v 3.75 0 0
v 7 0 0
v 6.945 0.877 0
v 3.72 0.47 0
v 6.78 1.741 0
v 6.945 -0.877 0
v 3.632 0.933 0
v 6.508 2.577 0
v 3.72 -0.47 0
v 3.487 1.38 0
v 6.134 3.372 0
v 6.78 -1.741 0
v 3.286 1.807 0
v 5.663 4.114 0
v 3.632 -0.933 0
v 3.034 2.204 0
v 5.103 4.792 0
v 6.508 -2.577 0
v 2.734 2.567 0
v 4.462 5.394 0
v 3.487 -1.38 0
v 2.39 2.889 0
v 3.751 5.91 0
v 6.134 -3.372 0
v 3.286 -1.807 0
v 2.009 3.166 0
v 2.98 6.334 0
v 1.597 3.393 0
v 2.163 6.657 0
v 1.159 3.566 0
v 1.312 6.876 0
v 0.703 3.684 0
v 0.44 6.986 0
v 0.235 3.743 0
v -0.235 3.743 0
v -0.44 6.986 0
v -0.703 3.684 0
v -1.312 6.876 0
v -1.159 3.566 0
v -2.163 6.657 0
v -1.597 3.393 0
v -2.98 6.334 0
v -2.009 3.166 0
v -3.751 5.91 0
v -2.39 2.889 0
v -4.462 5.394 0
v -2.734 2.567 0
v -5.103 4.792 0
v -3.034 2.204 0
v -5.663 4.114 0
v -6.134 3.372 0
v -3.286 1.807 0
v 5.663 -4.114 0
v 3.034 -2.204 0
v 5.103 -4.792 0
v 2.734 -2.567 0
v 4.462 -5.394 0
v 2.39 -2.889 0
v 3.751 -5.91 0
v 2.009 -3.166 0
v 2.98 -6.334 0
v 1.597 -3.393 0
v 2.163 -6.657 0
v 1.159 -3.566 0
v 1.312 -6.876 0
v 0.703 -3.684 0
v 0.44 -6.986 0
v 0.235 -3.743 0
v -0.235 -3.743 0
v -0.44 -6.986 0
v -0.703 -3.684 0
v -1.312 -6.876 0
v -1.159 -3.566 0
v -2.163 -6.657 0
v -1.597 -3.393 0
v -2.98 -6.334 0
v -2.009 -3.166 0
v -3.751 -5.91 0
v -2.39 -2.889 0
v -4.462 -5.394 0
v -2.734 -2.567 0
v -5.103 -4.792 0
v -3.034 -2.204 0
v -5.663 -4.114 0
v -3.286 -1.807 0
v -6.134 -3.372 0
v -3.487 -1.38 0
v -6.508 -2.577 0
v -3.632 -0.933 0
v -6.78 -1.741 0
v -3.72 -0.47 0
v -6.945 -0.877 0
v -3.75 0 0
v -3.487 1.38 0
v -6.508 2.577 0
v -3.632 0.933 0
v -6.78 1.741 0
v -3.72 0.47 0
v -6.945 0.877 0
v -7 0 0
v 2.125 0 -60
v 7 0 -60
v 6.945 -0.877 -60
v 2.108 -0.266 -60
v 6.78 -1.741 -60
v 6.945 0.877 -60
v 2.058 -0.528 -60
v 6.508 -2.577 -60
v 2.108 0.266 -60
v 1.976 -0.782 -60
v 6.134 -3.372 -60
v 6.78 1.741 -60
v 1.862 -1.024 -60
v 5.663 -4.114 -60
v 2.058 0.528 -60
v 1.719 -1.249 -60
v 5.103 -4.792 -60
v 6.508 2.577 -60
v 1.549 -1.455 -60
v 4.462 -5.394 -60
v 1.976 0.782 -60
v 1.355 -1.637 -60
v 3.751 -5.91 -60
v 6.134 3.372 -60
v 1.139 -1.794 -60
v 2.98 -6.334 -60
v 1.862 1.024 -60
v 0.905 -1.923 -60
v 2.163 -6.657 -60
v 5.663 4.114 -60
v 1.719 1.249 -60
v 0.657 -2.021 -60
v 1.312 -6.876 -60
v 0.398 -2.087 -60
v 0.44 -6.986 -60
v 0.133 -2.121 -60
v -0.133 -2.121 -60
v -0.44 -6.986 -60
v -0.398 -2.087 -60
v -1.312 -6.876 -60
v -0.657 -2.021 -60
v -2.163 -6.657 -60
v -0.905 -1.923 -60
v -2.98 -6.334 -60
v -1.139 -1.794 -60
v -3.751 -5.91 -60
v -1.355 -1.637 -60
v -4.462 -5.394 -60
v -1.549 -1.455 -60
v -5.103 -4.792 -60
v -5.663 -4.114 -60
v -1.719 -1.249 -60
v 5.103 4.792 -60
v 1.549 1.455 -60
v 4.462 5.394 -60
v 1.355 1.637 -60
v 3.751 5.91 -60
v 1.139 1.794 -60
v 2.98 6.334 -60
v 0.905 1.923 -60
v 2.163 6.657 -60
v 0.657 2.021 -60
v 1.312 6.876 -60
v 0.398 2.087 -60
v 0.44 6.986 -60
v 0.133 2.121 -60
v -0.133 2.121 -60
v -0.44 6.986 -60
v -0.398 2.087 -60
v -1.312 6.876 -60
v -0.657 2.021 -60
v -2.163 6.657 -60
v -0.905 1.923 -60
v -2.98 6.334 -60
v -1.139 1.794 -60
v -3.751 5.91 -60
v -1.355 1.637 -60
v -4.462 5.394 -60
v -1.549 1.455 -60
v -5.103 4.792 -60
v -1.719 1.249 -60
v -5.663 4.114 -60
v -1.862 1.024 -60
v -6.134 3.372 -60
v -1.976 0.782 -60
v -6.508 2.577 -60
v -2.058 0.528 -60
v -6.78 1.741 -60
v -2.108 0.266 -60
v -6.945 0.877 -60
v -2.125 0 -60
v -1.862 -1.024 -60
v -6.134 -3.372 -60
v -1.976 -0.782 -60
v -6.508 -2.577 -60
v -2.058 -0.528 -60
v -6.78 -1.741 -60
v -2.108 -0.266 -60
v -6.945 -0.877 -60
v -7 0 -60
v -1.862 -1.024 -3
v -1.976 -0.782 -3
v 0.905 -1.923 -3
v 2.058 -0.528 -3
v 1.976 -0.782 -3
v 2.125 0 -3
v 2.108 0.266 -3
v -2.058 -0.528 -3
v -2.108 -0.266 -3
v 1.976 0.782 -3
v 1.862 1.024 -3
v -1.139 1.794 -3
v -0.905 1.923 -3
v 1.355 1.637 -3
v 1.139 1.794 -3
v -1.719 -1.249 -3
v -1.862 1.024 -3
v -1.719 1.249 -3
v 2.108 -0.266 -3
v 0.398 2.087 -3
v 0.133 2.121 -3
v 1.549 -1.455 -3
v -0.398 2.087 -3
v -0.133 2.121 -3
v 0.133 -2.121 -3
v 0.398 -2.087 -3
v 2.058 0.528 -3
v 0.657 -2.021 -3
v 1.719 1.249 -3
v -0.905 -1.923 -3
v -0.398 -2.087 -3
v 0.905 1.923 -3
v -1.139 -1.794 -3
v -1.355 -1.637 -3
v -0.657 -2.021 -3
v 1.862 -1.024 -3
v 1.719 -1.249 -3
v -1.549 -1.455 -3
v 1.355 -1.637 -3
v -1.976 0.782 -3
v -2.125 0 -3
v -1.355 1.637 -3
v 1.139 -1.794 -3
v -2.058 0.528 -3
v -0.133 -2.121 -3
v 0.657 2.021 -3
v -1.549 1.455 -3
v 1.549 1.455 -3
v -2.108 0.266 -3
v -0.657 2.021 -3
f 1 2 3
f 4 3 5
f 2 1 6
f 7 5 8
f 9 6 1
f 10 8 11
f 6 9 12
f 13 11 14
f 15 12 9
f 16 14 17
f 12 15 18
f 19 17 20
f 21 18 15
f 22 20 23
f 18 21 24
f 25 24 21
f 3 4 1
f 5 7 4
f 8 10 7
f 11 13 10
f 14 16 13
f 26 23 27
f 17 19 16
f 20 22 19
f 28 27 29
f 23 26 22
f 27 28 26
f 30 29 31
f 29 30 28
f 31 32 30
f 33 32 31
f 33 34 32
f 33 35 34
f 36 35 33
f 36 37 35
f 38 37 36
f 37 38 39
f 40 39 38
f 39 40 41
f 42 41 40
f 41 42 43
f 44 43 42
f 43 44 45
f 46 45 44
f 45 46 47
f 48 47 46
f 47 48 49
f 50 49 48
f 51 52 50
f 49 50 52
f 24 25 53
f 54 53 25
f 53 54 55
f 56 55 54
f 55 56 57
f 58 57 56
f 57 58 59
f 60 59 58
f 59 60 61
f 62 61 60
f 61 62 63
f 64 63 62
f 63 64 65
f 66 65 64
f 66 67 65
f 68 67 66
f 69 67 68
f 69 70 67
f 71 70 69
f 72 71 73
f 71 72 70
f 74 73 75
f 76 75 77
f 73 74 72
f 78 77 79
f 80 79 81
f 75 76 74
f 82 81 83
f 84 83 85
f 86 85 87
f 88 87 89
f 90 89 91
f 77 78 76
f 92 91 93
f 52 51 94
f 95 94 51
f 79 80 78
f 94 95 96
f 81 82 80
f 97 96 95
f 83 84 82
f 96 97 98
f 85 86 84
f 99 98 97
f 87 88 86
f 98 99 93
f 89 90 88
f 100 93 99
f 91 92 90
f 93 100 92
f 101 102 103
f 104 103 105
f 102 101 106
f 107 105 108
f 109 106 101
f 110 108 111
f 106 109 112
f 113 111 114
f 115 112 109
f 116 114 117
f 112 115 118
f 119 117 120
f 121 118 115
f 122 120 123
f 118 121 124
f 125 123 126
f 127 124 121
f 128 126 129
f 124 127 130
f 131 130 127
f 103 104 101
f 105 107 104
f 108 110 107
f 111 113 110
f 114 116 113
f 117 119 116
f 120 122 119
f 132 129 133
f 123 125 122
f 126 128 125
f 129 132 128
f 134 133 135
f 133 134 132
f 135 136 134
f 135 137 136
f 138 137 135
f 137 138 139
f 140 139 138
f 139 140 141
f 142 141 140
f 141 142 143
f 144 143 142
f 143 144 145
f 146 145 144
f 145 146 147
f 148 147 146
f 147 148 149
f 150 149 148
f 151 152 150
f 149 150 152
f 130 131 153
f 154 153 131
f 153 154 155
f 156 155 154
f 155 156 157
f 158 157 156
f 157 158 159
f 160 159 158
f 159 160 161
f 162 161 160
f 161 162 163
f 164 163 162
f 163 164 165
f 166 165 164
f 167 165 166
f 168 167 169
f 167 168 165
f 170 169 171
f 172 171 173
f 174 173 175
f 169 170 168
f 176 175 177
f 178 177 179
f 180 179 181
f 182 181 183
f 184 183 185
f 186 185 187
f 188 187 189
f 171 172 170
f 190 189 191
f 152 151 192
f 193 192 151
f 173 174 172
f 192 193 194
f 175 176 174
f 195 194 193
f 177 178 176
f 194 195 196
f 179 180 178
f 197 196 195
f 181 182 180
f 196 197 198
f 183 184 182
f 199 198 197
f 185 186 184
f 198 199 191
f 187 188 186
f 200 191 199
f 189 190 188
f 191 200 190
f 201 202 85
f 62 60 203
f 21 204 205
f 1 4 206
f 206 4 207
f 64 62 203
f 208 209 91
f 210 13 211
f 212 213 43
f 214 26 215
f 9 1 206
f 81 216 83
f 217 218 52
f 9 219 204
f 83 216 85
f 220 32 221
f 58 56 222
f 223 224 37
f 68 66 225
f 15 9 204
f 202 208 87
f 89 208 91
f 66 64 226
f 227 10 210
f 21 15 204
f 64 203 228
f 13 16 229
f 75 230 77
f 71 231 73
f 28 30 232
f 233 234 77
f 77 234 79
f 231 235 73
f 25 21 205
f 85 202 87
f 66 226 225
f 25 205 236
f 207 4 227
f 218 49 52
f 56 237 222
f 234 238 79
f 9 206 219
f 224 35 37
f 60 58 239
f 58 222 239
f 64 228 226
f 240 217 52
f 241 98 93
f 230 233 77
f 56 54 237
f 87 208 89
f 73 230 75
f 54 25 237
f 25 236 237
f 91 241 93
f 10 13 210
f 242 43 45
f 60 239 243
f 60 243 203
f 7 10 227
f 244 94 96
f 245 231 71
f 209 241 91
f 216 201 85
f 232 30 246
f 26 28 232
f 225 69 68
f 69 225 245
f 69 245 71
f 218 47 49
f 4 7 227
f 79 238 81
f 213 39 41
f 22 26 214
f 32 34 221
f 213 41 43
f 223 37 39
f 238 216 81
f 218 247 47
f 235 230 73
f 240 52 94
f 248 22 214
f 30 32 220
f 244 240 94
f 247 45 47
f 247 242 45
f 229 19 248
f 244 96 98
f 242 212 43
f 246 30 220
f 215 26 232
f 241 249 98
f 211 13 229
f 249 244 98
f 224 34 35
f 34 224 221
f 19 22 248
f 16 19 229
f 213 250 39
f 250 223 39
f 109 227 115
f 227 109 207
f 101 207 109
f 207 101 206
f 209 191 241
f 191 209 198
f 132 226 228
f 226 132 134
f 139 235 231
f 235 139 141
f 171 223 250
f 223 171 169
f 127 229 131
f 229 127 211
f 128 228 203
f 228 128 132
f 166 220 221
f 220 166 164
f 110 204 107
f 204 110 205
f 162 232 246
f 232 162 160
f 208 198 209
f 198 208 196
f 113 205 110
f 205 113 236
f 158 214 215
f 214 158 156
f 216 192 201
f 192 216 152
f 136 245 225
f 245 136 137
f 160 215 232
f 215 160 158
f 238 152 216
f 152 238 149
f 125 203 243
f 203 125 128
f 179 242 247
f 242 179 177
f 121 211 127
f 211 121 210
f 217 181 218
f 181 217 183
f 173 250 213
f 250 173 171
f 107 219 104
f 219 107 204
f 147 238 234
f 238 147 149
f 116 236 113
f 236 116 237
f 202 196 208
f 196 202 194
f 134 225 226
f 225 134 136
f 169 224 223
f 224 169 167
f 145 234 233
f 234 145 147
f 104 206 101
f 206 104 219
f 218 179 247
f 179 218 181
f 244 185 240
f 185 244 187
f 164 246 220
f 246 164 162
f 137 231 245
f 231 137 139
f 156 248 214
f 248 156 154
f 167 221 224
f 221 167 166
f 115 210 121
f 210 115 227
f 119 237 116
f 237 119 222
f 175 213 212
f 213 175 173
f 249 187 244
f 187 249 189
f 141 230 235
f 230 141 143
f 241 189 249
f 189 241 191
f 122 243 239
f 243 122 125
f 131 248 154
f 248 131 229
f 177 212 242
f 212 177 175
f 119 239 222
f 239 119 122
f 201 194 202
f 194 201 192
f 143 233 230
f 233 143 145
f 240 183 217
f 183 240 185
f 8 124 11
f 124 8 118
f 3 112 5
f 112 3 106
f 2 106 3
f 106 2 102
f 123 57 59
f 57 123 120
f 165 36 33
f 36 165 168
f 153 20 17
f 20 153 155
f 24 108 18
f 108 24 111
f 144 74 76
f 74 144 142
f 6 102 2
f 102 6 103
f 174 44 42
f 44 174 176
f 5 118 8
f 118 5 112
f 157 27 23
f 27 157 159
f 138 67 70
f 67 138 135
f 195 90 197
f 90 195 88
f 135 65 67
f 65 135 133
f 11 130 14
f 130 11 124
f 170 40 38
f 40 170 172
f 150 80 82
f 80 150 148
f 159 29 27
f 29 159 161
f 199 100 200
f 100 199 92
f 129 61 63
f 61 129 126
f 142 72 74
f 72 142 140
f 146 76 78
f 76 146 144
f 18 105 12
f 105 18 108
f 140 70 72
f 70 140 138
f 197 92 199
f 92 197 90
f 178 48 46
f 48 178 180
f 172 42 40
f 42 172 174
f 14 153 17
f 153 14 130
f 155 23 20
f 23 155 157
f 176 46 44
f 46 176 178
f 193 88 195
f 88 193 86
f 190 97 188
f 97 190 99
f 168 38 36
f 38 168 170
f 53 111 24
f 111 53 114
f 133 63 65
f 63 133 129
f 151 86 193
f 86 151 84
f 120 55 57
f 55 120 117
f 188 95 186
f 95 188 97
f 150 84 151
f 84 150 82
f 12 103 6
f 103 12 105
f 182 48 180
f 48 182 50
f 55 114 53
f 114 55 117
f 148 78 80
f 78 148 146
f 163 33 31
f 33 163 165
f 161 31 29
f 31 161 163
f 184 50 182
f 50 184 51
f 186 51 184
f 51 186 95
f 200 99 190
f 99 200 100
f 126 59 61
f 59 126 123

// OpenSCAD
$fn = 50;


difference() {
	union() {
		translate(v = [0, 0, -60.0000000000]) {
			cylinder(h = 60, r = 7.0000000000);
		}
		cylinder(h = 0, r = 16.0000000000);
	}
	union() {
		translate(v = [0, 0, 0]) {
			rotate(a = [0, 0, 0]) {
				difference() {
					union() {
						#translate(v = [0, 0, -60.0000000000]) {
							cylinder(h = 60, r = 2.0000000000);
						}
						#translate(v = [0, 0, -3]) {
							cylinder(h = 3, r = 7.0000000000, r1 = 2.1250000000, r2 = 3.7500000000);
						}
						#translate(v = [0, 0, -60.0000000000]) {
							cylinder(h = 60, r = 2.1250000000);
						}
						#translate(v = [0, 0, -60.0000000000]) {
							cylinder(h = 60, r = 2.0000000000);
						}
					}
					union();
				}
			}
		}
	}
}
